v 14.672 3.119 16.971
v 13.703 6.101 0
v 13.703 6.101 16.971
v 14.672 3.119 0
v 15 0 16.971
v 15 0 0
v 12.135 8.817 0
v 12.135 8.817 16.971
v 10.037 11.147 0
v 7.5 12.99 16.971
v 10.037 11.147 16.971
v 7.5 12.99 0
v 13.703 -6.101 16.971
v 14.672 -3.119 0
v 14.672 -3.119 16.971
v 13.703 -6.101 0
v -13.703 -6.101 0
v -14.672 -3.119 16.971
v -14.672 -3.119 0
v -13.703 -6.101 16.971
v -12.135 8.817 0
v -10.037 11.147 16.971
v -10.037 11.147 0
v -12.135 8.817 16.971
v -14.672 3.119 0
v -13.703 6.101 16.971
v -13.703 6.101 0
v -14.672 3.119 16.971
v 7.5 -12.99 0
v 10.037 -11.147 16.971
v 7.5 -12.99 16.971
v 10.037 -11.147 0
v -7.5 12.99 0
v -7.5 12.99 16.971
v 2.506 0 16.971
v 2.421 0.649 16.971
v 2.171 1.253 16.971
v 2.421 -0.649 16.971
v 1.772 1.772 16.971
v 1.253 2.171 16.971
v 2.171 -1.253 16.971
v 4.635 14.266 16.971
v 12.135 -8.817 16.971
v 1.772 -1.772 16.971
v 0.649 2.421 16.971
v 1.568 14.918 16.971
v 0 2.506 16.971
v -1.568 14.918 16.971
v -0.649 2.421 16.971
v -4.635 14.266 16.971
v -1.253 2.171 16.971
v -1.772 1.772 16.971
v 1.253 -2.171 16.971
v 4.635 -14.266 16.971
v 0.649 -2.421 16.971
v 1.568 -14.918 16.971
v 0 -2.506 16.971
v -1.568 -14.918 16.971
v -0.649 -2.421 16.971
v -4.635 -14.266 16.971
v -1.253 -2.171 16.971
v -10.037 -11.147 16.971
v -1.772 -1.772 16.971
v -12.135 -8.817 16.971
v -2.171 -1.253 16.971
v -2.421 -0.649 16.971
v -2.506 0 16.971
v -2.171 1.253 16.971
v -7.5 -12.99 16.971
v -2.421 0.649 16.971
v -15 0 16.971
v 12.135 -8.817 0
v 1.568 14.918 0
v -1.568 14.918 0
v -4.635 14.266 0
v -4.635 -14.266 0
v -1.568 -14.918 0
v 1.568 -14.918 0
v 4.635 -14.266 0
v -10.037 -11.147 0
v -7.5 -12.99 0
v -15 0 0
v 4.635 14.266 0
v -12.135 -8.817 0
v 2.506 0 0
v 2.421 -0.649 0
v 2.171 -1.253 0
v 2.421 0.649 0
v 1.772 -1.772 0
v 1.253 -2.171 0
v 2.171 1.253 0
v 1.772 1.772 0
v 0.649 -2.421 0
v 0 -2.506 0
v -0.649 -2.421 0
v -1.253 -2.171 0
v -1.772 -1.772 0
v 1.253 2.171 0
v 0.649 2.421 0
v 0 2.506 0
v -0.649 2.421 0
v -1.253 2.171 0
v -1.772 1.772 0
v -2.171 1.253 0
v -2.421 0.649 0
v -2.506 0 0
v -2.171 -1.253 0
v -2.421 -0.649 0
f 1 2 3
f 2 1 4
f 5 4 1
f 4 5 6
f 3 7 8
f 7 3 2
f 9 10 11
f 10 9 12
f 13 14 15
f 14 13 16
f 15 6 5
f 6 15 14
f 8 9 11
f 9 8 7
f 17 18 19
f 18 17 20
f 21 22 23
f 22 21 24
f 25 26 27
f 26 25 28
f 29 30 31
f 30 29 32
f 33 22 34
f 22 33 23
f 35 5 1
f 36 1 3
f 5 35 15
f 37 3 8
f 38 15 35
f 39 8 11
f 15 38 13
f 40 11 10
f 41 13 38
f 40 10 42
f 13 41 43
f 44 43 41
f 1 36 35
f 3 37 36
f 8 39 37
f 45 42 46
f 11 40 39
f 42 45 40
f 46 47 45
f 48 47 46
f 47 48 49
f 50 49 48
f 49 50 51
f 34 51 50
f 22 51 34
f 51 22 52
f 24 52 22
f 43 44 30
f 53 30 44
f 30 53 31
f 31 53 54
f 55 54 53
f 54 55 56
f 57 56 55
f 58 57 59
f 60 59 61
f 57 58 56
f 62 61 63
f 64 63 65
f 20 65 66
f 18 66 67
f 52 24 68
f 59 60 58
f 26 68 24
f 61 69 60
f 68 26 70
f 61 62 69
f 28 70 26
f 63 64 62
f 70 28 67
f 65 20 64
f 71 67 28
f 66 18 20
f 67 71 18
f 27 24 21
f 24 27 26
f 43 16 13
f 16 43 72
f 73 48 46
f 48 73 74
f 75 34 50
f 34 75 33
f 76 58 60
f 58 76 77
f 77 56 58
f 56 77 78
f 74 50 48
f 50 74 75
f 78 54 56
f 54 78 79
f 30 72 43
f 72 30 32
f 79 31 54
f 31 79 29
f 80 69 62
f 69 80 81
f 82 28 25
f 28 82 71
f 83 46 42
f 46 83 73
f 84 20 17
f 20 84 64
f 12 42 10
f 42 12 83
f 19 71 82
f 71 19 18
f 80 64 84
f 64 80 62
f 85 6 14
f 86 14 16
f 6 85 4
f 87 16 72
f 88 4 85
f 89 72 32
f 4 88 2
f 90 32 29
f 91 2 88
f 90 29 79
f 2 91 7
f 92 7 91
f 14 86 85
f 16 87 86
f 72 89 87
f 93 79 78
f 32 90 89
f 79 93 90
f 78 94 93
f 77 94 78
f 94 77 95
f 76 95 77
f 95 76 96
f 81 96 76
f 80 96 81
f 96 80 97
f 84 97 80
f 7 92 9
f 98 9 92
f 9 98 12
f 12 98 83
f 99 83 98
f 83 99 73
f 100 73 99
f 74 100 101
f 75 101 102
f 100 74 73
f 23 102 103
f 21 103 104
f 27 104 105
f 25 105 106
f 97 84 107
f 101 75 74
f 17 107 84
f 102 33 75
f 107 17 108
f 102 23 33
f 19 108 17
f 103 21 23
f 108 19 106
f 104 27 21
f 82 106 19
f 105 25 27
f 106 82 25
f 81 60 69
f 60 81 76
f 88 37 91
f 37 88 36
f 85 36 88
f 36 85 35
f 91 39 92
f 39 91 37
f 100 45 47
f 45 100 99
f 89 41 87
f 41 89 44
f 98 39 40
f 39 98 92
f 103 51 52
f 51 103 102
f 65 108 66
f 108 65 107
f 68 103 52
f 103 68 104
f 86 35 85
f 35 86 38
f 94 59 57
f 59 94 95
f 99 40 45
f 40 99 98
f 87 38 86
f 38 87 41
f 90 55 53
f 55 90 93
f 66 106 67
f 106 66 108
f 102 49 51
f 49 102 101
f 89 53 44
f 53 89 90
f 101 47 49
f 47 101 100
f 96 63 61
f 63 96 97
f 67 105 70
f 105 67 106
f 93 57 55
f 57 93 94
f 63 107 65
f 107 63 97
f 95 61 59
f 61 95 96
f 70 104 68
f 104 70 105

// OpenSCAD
//hub
hub = false;
hub_z = 7;
hub_r = 8;

//shaft
shaft = "round"; //"square" "rectangle", "round", "round_cut"
shaft_a = 4.97/2;
shaft_b = 4.52/2;

//wheel
wheel_r = 15;

//grooves
grooves_num = 2;
groov_depth = 6;


//----------------------------------------------------
wheel_z = groov_depth*sqrt(2)*grooves_num;

module body() {
 total_z = hub_z + wheel_z;
 difference() {
   if(hub){
       cylinder(h=total_z,r=hub_r);
   }else{
       main_wheel();
   }
   shaft(total_z);
 }
 if(hub){
    main_wheel();
 }
}

module shaft(total_z){
  if(shaft == "square"){
    translate([-shaft_a/2,-shaft_a/2,-total_z/2]) {
      cube([shaft_a,shaft_a,total_z*2], 1);
    }
  }else if(shaft == "rectangle"){
    translate([-shaft_a/2,-shaft_b/2,-total_z/2]) {
      cube([shaft_a,shaft_b,total_z*2], 1);
    }
  }else if(shaft == "round"){
    translate([0,0,-total_z/2]) {
      cylinder_outer(total_z*2, shaft_a,24);
    }
  }else if(shaft == "round_cut"){
    translate([0,0,-total_z/2]) {
      difference() {
        cylinder_outer(total_z*2, shaft_a,24);
        translate([shaft_b,-shaft_a*2,-total_z/2]) {
          cube([shaft_a*4,shaft_a*4,total_z*2], 1);
        }
      }
    }
  }
}

module cylinder_outer(height,radius,fn){
 fudge = 1/cos(180/fn);
 cylinder(h=height,r=radius*fudge,$fn=fn);
}
module main_wheel(){
  cylinder(h=wheel_z,r=wheel_r);
}

module screws() {
  translate([0,0,wheel_z+(hub_z/2)]) 
    rotate(90,[0,1,0]) 
      translate([0,0,-15]) 
        cylinder(h=30,r=2);
}

module groove() {
 rotate_extrude(convexity = 100){ 
   for(i = [1, grooves_num]){
     translate([wheel_r+1.25, groov_depth*sqrt(2)*(i-1), 0])
       rotate(45)
         square([groov_depth,groov_depth],0); 
   }
 }
}

module no_screws() {
  difference() {
    body();
    groove();
  }
}

difference() {
  no_screws();
  screws();
}
